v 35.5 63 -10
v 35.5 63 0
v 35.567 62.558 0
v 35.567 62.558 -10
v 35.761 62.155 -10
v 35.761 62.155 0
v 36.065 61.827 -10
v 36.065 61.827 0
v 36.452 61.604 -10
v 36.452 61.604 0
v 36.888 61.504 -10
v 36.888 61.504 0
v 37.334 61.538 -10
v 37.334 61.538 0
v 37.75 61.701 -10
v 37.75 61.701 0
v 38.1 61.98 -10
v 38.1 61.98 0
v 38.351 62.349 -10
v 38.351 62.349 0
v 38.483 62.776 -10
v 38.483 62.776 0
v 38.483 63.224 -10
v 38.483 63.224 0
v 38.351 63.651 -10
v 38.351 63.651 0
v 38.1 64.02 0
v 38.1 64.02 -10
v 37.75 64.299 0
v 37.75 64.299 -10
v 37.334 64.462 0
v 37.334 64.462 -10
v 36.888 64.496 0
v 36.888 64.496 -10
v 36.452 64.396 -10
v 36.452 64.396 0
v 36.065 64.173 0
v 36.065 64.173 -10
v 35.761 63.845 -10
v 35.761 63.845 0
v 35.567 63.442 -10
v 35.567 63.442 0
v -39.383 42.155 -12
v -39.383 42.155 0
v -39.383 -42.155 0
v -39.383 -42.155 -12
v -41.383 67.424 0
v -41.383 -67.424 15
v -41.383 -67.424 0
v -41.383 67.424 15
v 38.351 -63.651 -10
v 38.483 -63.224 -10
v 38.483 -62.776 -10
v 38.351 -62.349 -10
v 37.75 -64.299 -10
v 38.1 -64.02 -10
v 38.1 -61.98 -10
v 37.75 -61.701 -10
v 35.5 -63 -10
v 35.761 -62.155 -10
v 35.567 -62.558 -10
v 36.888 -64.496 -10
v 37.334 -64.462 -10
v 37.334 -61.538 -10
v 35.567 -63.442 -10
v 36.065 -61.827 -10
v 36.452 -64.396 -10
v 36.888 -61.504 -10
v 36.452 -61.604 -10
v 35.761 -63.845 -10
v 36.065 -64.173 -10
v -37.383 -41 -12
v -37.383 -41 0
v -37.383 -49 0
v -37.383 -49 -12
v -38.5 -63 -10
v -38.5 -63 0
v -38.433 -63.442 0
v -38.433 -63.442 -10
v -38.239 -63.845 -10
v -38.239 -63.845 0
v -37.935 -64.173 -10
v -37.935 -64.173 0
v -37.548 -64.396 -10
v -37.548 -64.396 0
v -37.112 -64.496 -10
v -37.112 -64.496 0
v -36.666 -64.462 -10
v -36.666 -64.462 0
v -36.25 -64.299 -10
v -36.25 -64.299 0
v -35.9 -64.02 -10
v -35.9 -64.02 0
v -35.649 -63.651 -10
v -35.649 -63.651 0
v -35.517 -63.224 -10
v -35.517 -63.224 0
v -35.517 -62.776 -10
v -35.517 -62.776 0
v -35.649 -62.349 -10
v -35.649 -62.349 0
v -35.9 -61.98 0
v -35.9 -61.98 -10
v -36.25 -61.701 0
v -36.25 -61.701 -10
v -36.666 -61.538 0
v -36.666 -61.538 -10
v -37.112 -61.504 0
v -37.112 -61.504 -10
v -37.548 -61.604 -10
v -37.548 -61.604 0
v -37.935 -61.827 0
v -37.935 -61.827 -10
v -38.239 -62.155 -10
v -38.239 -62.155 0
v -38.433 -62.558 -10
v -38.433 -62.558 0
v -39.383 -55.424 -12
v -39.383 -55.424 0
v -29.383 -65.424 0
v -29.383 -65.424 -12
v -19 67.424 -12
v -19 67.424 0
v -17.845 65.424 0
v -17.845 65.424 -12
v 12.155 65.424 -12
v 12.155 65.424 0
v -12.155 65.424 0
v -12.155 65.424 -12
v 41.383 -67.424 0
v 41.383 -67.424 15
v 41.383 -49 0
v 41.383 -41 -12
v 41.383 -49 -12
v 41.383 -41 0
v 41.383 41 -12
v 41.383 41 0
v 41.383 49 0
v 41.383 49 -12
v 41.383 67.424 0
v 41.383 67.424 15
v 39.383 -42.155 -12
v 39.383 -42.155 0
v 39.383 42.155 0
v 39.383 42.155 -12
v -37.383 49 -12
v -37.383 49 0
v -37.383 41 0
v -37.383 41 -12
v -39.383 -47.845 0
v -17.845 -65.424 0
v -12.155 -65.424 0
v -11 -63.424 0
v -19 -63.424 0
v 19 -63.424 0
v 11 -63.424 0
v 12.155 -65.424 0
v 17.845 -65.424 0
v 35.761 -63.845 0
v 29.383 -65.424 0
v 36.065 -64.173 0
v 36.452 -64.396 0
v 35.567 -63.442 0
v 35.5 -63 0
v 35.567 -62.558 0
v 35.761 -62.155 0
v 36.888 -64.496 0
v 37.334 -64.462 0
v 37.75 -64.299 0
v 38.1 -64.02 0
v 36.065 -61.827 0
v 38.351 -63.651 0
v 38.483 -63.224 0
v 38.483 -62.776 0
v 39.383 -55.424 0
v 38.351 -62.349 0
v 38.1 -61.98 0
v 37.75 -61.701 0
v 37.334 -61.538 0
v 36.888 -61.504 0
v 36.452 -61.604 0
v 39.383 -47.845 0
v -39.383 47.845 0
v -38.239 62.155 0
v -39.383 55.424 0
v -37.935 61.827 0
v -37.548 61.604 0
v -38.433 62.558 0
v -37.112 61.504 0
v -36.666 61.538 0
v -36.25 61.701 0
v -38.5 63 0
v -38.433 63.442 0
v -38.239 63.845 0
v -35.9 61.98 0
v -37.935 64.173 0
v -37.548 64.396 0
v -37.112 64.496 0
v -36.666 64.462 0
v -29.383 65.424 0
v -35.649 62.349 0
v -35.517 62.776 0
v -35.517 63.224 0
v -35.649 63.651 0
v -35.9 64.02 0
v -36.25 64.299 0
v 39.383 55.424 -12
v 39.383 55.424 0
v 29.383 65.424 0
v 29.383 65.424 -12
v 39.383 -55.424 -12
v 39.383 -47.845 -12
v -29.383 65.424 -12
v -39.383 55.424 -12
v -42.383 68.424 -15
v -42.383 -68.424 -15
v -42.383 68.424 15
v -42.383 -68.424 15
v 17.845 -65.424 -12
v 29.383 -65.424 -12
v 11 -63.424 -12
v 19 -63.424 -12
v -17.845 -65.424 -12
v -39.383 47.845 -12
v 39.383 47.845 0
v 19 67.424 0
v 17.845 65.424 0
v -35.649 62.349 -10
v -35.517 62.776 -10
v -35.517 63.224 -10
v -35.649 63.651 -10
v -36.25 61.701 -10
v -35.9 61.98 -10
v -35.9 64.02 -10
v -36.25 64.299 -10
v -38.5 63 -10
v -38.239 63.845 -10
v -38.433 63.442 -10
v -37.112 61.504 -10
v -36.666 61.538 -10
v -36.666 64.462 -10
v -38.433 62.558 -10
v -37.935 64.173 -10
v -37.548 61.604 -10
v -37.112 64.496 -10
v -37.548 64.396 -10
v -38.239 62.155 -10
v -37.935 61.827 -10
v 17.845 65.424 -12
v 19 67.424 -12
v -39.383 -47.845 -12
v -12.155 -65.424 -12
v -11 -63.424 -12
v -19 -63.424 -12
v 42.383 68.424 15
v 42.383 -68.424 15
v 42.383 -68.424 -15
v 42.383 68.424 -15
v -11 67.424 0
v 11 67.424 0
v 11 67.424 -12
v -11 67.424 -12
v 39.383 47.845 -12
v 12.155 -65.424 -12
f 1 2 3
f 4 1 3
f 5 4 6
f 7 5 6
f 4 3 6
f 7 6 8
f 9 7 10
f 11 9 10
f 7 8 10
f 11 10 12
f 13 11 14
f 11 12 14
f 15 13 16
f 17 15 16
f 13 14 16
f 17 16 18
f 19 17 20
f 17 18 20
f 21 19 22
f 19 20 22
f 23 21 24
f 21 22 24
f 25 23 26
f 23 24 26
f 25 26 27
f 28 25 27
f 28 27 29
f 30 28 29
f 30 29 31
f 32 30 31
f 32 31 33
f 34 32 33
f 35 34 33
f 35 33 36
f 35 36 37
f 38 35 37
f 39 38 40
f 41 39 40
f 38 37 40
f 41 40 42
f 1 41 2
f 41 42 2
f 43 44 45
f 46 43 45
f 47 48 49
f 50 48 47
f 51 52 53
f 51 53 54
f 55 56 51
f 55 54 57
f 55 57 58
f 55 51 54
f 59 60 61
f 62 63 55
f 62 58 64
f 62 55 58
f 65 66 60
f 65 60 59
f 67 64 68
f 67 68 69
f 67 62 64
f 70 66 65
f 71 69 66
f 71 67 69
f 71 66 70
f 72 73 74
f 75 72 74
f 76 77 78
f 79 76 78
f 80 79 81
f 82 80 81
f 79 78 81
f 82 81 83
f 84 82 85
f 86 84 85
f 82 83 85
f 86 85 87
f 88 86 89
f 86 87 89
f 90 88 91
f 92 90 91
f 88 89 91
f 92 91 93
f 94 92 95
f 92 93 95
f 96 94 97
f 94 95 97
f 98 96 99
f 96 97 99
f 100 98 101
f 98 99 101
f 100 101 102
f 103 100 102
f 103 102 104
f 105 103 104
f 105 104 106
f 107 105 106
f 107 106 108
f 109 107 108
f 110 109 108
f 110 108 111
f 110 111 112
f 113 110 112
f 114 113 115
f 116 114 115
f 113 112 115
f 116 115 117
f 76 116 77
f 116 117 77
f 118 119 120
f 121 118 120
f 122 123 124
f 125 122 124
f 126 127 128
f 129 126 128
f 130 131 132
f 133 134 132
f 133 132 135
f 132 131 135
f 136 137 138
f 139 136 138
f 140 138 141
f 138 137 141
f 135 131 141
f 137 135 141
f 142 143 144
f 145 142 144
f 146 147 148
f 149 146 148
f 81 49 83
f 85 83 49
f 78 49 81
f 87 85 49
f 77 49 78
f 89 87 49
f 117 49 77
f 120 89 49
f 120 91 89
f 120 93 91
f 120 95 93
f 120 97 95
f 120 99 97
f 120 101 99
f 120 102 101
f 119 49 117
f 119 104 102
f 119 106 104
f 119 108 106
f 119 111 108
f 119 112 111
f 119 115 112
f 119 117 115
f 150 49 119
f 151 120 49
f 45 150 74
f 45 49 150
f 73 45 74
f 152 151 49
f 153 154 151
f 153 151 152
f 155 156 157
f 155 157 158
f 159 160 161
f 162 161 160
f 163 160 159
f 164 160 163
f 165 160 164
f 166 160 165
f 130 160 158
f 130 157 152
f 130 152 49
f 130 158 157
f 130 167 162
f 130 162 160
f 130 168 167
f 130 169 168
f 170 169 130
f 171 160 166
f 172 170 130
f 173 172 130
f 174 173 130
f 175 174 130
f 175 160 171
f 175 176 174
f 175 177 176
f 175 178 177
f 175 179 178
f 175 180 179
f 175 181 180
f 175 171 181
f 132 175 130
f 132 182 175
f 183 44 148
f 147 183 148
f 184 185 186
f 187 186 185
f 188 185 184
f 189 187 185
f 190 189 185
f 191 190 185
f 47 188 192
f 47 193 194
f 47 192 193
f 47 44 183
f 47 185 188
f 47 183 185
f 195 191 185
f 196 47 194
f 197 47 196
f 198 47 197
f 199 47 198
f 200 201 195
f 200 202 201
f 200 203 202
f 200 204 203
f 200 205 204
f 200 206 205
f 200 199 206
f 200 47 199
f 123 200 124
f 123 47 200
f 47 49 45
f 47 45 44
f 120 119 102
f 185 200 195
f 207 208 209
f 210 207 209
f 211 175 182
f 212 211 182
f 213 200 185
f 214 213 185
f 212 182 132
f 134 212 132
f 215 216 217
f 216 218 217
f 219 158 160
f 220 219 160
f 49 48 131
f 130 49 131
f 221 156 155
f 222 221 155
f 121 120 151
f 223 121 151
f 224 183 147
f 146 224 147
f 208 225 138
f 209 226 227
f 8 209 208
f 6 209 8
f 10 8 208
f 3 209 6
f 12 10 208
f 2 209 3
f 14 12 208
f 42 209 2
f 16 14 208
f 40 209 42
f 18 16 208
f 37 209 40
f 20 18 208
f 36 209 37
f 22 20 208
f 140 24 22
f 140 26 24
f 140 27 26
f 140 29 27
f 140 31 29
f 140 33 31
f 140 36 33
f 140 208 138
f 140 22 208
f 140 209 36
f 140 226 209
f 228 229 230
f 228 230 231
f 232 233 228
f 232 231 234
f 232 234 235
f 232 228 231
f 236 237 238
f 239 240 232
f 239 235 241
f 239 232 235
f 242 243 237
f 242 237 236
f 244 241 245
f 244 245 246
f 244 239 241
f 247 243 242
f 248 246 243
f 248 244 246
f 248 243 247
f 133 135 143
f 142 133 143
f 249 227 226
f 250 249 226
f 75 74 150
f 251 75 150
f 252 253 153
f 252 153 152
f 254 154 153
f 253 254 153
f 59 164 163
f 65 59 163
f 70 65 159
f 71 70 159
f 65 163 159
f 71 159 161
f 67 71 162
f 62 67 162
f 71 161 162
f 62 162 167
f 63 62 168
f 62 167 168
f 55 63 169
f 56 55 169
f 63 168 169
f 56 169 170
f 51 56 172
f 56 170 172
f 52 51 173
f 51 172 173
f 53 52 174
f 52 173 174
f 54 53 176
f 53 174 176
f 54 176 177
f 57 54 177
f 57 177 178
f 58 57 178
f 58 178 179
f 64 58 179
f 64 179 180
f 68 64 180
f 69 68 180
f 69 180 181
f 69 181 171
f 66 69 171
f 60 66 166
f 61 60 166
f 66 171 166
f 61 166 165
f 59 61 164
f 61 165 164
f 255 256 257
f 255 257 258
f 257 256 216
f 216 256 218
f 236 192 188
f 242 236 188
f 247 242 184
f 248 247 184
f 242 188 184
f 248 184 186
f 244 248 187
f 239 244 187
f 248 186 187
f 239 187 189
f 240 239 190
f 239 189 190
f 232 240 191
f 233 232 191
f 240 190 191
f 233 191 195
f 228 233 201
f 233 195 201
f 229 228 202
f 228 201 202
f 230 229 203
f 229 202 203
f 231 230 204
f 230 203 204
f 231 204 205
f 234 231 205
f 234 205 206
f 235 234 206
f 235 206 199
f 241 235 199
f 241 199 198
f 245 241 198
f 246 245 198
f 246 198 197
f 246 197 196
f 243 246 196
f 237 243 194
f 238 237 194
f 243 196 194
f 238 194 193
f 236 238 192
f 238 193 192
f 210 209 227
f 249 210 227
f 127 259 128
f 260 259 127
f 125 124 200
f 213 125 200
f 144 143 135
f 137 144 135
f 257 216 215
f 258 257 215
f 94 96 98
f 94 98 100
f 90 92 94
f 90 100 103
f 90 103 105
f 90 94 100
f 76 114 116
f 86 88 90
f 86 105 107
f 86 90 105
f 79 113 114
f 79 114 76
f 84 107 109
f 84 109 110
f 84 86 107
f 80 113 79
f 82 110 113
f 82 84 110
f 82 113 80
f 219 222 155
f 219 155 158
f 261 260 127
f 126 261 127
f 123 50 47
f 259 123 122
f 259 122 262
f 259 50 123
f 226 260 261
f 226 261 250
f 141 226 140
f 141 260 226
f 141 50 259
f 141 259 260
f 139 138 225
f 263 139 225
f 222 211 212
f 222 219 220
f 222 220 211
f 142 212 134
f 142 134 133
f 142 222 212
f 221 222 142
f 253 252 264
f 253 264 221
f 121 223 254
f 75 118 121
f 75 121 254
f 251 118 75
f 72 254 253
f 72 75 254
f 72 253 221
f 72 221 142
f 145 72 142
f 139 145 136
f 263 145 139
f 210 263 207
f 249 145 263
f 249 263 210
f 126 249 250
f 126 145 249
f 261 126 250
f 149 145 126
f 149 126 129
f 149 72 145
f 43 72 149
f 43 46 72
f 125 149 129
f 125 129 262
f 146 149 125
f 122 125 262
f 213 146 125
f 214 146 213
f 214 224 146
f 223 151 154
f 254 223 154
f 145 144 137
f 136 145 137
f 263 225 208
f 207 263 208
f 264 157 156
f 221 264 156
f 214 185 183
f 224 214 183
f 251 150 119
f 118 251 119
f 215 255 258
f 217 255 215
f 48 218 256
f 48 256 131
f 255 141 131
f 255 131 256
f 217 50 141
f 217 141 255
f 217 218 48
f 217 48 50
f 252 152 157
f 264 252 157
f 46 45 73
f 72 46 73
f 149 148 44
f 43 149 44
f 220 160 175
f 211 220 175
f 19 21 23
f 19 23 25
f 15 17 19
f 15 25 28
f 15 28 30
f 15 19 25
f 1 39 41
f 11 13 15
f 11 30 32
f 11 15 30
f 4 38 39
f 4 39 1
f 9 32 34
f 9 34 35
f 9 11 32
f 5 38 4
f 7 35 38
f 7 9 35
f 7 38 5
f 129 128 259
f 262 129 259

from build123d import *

# Parameters (mm, degrees)
CROQUIS2_W              = 136.848636308
CROQUIS2_H              = 84.76602742
SALIENTE_EXTRUIR1_DEPTH = 15
CORTAR_EXTRUIR1_START   = 15
CORTAR_EXTRUIR1_DEPTH   = 27
CROQUIS4_W              = 82.76602742
CROQUIS4_H              = 134.848636308
CORTAR_EXTRUIR2_DEPTH   = 15
CROQUIS6_R              = 1.5
CORTAR_EXTRUIR3_DEPTH   = 10


with BuildPart() as part:
    # Croquis2 → Saliente-Extruir1 (new, symmetric)
    with BuildSketch(Plane(origin=(0, 0, 0), x_dir=(0, 1, 0), z_dir=(0, 0, 1))):
        Rectangle(CROQUIS2_W, CROQUIS2_H)
    extrude(amount=SALIENTE_EXTRUIR1_DEPTH, both=True)

    # Croquis3 → Cortar-Extruir1 (cut)
    with BuildSketch(Plane(origin=(0, 0, 0), x_dir=(0, 1, 0), z_dir=(0, 0, 1)).offset(CORTAR_EXTRUIR1_START)):
        Polygon((-55.424318154, -39.38301371), (-47.845299462, -39.38301371), (-49, -41.38301371), (-41, -41.38301371), (-42.154700538, -39.38301371), (42.154700538, -39.38301371), (41, -41.38301371), (49, -41.38301371), (47.845299462, -39.38301371), (55.424318154, -39.38301371), (65.424318154, -29.38301371), (65.424318154, -17.845299462), (67.424318154, -19), (67.424318154, -11), (65.424318154, -12.154700538), (65.424318154, 12.154700538), (67.424318154, 11), (67.424318154, 19), (65.424318154, 17.845299462), (65.424318154, 29.38301371), (55.424318154, 39.38301371), (47.845299462, 39.38301371), (49, 37.38301371), (41, 37.38301371), (42.154700538, 39.38301371), (-42.154700538, 39.38301371), (-41, 37.38301371), (-49, 37.38301371), (-47.845299462, 39.38301371), (-55.424318154, 39.38301371), (-65.424318154, 29.38301371), (-65.424318154, 17.845299462), (-63.424318154, 19), (-63.424318154, 11), (-65.424318154, 12.154700538), (-65.424318154, -12.154700538), (-63.424318154, -11), (-63.424318154, -19), (-65.424318154, -17.845299462), (-65.424318154, -29.38301371), align=None)
    extrude(amount=-CORTAR_EXTRUIR1_DEPTH, mode=Mode.SUBTRACT)

    # Croquis4 → Cortar-Extruir2 (cut)
    with BuildSketch(Plane.XY.offset(15)):
        Rectangle(CROQUIS4_W, CROQUIS4_H)
    extrude(amount=-CORTAR_EXTRUIR2_DEPTH, mode=Mode.SUBTRACT)

    # Croquis6 → Cortar-Extruir3 (cut)
    with BuildSketch(Plane.XY):
        with Locations(Location((-37, 63, 0), (0, 0, 180))):
            Circle(CROQUIS6_R)
        with Locations(Location((37, 63, 0), (0, 0, 180))):
            Circle(CROQUIS6_R)
        with Locations(Location((37, -63, 0), (0, 0, 180))):
            Circle(CROQUIS6_R)
        with Locations(Location((-37, -63, 0), (0, 0, 180))):
            Circle(CROQUIS6_R)
    extrude(amount=-CORTAR_EXTRUIR3_DEPTH, mode=Mode.SUBTRACT)


solid = part.part
